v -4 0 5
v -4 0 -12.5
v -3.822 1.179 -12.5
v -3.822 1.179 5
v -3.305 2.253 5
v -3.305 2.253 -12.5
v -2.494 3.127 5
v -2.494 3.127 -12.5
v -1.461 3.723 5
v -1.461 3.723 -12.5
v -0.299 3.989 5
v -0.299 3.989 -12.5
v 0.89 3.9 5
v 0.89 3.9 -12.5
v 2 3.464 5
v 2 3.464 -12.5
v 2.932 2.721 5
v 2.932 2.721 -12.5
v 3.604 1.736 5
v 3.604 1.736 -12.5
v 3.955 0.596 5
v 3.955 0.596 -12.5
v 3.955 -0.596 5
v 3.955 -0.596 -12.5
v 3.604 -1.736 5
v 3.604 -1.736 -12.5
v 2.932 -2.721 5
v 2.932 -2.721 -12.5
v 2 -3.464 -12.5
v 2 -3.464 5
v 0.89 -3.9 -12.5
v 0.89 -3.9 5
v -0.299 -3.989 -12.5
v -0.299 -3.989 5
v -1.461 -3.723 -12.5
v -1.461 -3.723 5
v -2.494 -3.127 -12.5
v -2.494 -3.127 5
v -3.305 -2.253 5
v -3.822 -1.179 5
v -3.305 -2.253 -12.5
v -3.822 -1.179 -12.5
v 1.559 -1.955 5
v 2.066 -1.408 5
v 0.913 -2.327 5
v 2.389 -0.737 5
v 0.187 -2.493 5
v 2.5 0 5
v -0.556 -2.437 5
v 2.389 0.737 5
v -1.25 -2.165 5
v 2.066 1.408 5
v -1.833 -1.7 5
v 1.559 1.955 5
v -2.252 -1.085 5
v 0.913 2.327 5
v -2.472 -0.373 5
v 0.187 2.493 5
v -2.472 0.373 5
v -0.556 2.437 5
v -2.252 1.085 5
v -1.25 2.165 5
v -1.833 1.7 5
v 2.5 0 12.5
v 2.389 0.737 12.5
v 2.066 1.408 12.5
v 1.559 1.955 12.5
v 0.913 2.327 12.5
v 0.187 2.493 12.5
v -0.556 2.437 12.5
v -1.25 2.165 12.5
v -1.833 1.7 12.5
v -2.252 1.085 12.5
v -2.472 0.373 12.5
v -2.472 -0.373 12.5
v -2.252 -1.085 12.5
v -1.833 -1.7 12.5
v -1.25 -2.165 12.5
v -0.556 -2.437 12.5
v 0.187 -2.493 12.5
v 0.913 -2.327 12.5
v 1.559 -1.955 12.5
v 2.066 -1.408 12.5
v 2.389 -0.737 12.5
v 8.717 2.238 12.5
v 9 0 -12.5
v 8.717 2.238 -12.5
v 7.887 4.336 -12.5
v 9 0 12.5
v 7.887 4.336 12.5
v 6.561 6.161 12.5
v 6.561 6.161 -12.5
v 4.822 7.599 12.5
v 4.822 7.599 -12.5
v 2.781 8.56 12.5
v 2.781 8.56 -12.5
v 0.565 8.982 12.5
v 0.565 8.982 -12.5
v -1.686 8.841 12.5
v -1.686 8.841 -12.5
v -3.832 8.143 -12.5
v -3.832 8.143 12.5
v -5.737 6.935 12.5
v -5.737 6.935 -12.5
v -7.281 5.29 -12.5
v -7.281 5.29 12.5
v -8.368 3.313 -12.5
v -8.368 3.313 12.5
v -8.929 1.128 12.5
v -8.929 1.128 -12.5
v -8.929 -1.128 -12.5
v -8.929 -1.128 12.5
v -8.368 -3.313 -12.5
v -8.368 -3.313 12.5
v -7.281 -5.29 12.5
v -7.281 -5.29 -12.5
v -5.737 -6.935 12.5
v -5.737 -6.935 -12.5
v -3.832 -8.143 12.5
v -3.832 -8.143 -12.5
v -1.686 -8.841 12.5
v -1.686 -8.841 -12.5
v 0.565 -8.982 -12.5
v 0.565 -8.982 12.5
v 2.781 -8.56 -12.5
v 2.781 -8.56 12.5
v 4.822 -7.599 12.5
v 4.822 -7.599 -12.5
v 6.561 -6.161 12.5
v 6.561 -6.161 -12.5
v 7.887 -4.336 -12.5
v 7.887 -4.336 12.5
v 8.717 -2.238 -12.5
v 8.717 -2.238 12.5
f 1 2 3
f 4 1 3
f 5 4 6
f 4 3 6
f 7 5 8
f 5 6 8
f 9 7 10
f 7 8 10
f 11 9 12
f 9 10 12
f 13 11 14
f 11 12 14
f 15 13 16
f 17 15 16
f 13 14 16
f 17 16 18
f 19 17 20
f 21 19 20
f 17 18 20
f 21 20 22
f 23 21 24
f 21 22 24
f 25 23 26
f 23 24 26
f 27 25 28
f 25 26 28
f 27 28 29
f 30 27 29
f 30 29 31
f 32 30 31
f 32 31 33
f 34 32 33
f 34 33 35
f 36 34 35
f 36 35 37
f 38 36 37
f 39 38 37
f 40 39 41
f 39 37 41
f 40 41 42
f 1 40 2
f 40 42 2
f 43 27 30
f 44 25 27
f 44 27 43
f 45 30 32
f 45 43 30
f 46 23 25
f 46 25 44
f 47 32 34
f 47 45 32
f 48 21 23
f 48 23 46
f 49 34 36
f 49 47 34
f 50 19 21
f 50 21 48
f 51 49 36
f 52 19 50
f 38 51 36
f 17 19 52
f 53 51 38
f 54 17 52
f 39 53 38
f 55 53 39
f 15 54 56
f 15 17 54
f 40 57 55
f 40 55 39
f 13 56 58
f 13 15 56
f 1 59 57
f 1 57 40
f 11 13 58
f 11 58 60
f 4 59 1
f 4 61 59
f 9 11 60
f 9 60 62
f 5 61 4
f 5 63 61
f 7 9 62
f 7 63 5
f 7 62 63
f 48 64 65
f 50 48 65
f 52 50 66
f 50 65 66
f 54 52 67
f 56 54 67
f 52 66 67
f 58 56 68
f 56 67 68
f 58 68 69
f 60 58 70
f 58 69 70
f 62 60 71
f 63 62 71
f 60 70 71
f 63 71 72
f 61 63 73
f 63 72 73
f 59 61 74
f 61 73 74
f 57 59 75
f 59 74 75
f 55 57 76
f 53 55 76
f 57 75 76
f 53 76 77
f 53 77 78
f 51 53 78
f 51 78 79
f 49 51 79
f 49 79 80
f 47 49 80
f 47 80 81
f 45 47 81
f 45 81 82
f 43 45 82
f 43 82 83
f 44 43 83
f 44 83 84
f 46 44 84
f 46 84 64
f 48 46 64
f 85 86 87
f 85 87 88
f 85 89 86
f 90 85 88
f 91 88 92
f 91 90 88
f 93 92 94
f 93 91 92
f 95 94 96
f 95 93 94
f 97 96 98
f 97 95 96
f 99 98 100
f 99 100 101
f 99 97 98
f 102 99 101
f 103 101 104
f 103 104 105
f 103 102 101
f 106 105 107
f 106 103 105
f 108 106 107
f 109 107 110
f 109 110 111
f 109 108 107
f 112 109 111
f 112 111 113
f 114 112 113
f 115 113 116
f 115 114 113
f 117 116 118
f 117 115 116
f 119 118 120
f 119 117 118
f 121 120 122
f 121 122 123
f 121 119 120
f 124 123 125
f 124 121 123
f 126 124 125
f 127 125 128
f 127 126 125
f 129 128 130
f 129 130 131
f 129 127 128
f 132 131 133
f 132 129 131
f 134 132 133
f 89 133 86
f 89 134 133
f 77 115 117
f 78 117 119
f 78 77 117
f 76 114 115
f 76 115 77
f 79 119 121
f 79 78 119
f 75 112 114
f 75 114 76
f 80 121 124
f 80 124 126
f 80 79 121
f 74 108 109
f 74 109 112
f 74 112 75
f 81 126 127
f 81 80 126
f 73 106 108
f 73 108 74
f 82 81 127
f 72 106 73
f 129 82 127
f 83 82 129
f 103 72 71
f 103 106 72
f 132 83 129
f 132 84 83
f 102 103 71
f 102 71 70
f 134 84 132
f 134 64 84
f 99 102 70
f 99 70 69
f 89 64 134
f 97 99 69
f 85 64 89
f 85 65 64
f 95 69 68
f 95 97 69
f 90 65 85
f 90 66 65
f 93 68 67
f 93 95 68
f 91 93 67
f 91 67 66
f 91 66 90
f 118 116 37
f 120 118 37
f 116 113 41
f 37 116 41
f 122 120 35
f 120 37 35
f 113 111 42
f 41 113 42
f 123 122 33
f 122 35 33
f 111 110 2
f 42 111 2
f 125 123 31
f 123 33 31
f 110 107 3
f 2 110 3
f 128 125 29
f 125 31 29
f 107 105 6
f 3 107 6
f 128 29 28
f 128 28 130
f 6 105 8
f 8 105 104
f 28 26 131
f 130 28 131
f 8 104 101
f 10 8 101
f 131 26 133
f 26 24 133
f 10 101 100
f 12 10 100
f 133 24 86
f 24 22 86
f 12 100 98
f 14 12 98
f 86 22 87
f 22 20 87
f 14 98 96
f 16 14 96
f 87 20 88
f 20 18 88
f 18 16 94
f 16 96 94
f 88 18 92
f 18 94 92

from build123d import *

# Parameters (mm, degrees)
SKETCH1_R           = 9
BOSS_EXTRUDE1_DEPTH = 12.5
SKETCH2_R           = 2.5
CUT_EXTRUDE1_DEPTH  = 26
SKETCH3_R           = 4
CUT_EXTRUDE2_DEPTH  = 17.5


with BuildPart() as part:
    # Sketch1 → Boss-Extrude1 (new body, symmetric)
    with BuildSketch(Plane.XY):
        Circle(SKETCH1_R)
    extrude(amount=BOSS_EXTRUDE1_DEPTH, both=True)

    # Sketch2 → Cut-Extrude1 (cut, through all)
    with BuildSketch(Plane.XY.offset(12.5)):
        Circle(SKETCH2_R)
    extrude(amount=-CUT_EXTRUDE1_DEPTH, mode=Mode.SUBTRACT)

    # Sketch3 → Cut-Extrude2 (cut)
    with BuildSketch(Plane(origin=(0, 0, -12.5), x_dir=(-1, 0, 0), z_dir=(0, 0, -1))):
        Circle(SKETCH3_R)
    extrude(amount=-CUT_EXTRUDE2_DEPTH, mode=Mode.SUBTRACT)


solid = part.part
